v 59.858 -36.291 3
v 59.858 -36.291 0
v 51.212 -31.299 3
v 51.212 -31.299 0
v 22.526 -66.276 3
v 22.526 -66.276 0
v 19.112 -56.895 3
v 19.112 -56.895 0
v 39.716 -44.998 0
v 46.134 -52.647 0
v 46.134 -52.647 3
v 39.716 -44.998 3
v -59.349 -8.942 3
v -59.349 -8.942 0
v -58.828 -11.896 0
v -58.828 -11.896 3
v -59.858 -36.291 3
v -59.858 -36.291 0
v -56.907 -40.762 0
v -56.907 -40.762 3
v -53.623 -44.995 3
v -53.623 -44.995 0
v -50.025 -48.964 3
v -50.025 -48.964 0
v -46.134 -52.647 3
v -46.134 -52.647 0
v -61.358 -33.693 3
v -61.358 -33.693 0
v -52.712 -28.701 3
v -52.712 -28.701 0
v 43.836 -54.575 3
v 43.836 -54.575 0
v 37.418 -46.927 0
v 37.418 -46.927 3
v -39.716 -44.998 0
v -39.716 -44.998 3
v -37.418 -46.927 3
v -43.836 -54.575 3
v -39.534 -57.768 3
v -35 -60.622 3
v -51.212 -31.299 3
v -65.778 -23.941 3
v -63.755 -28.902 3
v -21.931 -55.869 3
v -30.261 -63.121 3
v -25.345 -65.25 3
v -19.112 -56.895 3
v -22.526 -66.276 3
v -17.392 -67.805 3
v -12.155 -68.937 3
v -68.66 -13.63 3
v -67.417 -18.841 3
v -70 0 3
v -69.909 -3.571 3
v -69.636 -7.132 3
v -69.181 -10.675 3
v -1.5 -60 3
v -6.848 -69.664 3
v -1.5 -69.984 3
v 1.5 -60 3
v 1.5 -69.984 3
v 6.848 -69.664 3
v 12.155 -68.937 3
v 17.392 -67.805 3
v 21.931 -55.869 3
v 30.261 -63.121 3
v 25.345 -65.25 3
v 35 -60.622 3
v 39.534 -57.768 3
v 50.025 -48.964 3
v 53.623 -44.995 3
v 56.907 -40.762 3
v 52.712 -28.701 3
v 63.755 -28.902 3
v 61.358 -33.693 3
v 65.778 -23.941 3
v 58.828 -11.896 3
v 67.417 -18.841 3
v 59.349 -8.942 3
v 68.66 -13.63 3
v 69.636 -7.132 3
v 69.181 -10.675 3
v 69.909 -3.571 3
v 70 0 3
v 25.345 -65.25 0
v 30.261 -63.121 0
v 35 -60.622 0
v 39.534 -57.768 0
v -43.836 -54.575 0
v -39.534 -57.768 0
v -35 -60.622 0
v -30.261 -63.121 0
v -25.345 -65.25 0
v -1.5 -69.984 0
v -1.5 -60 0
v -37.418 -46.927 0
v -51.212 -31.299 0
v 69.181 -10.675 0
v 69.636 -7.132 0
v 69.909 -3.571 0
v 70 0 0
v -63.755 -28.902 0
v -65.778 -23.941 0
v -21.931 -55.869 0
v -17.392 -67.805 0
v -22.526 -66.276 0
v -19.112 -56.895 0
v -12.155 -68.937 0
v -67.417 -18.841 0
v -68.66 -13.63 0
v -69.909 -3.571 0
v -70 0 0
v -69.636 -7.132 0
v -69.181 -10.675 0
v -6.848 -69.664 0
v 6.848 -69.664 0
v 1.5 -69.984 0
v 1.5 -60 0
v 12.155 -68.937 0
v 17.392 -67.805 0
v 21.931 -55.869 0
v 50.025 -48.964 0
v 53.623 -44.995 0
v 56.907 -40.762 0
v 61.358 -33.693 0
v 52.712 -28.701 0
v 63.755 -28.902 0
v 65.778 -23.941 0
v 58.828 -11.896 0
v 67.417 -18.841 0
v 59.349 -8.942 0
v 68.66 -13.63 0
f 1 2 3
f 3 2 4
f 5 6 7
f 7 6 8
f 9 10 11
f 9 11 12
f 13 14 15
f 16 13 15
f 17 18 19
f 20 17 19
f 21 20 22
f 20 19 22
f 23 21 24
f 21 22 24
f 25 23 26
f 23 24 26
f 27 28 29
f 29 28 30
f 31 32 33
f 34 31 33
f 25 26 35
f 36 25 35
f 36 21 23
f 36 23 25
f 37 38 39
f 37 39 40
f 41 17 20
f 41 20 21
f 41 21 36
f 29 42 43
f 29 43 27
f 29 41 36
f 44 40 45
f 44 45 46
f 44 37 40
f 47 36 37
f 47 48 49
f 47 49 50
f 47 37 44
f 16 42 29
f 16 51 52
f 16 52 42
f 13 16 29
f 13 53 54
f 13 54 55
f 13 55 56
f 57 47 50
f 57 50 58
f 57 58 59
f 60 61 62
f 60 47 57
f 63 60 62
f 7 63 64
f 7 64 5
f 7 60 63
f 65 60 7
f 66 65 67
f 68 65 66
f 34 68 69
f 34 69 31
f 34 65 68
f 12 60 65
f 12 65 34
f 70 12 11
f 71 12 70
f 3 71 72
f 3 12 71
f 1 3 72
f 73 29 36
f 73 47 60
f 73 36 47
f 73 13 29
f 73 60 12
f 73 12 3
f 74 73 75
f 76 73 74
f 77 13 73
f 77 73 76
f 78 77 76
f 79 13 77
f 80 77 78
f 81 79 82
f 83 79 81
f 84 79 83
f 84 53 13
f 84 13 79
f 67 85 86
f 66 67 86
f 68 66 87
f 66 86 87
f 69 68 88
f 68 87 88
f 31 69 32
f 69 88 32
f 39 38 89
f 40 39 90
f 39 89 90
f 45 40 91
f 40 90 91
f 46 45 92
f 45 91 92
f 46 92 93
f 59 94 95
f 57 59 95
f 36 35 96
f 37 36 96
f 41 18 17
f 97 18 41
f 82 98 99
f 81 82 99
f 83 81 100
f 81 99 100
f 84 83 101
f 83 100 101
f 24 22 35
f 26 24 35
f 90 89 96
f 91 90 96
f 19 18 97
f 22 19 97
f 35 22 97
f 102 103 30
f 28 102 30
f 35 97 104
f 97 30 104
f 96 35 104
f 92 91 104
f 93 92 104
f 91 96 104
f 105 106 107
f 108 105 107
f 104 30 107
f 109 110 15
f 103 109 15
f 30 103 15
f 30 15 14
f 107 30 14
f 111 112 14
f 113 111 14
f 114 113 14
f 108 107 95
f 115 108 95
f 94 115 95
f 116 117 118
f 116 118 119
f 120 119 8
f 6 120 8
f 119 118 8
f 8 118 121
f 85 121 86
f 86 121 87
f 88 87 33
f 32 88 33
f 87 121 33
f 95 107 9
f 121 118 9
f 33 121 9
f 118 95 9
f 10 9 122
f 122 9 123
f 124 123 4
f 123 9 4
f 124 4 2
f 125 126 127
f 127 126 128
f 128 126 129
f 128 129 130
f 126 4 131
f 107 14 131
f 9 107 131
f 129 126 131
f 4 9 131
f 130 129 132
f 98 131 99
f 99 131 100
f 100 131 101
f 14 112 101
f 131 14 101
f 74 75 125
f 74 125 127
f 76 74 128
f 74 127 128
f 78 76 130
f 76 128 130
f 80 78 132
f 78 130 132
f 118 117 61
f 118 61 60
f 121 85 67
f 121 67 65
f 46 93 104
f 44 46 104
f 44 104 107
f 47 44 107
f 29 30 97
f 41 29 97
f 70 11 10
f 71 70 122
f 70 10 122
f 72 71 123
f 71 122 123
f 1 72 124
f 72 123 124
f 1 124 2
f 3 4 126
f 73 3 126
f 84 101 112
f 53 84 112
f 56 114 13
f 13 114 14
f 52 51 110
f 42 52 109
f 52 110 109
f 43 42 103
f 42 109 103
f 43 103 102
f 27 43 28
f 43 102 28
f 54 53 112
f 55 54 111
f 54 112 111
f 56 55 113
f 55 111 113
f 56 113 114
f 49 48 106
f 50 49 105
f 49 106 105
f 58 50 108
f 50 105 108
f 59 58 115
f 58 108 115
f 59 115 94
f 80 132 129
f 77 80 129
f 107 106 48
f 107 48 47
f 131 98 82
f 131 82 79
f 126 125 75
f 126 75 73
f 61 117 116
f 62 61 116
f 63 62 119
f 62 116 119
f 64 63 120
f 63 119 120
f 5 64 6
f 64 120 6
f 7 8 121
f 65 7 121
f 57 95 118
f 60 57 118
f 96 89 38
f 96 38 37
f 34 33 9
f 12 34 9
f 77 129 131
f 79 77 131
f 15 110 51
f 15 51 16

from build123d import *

# Parameters (mm, degrees)
BOSS_EXTRUDE1_DEPTH             = 3
SKETCH5_W                       = 3
SKETCH5_H                       = 10
CUT_EXTRUDE2_DEPTH              = 100.040395799
CIRPATTERN1_COUNT               = 5
CIRPATTERN1_ANGLE               = 80
CIRPATTERN1_THE_OTHER_WAY_COUNT = 5
CIRPATTERN1_THE_OTHER_WAY_ANGLE = 80


with BuildPart() as part:
    # Sketch4 → Boss-Extrude1 (new body)
    with BuildSketch(Plane.XY):
        with BuildLine():
            Line((70, 0), (-70, 0))
            ThreePointArc((-70, 0), (0, -70), (70, 0))
        make_face()
    extrude(amount=BOSS_EXTRUDE1_DEPTH)

    # Sketch5 → Cut-Extrude2 (cut, through all)
    with BuildSketch(Plane.XY):
        with Locations((0, -65)):
            Rectangle(SKETCH5_W, SKETCH5_H)
    cut_extrude2 = extrude(amount=CUT_EXTRUDE2_DEPTH, mode=Mode.SUBTRACT)

    # CirPattern1: Cut-Extrude2 ×5 about axis
    cirpattern1_axis = Axis((0, 0, 3), (0, 0, -1))
    for i in range(1, CIRPATTERN1_COUNT):
        add(cut_extrude2.rotate(cirpattern1_axis, i * CIRPATTERN1_ANGLE / (CIRPATTERN1_COUNT - 1)), mode=Mode.SUBTRACT)

    # CirPattern1 the other way: Cut-Extrude2 ×5 about axis
    cirpattern1_the_other_way_axis = Axis((0, 0, 3), (0, 0, 1))
    for i in range(1, CIRPATTERN1_THE_OTHER_WAY_COUNT):
        add(cut_extrude2.rotate(cirpattern1_the_other_way_axis, i * CIRPATTERN1_THE_OTHER_WAY_ANGLE / (CIRPATTERN1_THE_OTHER_WAY_COUNT - 1)), mode=Mode.SUBTRACT)


solid = part.part
